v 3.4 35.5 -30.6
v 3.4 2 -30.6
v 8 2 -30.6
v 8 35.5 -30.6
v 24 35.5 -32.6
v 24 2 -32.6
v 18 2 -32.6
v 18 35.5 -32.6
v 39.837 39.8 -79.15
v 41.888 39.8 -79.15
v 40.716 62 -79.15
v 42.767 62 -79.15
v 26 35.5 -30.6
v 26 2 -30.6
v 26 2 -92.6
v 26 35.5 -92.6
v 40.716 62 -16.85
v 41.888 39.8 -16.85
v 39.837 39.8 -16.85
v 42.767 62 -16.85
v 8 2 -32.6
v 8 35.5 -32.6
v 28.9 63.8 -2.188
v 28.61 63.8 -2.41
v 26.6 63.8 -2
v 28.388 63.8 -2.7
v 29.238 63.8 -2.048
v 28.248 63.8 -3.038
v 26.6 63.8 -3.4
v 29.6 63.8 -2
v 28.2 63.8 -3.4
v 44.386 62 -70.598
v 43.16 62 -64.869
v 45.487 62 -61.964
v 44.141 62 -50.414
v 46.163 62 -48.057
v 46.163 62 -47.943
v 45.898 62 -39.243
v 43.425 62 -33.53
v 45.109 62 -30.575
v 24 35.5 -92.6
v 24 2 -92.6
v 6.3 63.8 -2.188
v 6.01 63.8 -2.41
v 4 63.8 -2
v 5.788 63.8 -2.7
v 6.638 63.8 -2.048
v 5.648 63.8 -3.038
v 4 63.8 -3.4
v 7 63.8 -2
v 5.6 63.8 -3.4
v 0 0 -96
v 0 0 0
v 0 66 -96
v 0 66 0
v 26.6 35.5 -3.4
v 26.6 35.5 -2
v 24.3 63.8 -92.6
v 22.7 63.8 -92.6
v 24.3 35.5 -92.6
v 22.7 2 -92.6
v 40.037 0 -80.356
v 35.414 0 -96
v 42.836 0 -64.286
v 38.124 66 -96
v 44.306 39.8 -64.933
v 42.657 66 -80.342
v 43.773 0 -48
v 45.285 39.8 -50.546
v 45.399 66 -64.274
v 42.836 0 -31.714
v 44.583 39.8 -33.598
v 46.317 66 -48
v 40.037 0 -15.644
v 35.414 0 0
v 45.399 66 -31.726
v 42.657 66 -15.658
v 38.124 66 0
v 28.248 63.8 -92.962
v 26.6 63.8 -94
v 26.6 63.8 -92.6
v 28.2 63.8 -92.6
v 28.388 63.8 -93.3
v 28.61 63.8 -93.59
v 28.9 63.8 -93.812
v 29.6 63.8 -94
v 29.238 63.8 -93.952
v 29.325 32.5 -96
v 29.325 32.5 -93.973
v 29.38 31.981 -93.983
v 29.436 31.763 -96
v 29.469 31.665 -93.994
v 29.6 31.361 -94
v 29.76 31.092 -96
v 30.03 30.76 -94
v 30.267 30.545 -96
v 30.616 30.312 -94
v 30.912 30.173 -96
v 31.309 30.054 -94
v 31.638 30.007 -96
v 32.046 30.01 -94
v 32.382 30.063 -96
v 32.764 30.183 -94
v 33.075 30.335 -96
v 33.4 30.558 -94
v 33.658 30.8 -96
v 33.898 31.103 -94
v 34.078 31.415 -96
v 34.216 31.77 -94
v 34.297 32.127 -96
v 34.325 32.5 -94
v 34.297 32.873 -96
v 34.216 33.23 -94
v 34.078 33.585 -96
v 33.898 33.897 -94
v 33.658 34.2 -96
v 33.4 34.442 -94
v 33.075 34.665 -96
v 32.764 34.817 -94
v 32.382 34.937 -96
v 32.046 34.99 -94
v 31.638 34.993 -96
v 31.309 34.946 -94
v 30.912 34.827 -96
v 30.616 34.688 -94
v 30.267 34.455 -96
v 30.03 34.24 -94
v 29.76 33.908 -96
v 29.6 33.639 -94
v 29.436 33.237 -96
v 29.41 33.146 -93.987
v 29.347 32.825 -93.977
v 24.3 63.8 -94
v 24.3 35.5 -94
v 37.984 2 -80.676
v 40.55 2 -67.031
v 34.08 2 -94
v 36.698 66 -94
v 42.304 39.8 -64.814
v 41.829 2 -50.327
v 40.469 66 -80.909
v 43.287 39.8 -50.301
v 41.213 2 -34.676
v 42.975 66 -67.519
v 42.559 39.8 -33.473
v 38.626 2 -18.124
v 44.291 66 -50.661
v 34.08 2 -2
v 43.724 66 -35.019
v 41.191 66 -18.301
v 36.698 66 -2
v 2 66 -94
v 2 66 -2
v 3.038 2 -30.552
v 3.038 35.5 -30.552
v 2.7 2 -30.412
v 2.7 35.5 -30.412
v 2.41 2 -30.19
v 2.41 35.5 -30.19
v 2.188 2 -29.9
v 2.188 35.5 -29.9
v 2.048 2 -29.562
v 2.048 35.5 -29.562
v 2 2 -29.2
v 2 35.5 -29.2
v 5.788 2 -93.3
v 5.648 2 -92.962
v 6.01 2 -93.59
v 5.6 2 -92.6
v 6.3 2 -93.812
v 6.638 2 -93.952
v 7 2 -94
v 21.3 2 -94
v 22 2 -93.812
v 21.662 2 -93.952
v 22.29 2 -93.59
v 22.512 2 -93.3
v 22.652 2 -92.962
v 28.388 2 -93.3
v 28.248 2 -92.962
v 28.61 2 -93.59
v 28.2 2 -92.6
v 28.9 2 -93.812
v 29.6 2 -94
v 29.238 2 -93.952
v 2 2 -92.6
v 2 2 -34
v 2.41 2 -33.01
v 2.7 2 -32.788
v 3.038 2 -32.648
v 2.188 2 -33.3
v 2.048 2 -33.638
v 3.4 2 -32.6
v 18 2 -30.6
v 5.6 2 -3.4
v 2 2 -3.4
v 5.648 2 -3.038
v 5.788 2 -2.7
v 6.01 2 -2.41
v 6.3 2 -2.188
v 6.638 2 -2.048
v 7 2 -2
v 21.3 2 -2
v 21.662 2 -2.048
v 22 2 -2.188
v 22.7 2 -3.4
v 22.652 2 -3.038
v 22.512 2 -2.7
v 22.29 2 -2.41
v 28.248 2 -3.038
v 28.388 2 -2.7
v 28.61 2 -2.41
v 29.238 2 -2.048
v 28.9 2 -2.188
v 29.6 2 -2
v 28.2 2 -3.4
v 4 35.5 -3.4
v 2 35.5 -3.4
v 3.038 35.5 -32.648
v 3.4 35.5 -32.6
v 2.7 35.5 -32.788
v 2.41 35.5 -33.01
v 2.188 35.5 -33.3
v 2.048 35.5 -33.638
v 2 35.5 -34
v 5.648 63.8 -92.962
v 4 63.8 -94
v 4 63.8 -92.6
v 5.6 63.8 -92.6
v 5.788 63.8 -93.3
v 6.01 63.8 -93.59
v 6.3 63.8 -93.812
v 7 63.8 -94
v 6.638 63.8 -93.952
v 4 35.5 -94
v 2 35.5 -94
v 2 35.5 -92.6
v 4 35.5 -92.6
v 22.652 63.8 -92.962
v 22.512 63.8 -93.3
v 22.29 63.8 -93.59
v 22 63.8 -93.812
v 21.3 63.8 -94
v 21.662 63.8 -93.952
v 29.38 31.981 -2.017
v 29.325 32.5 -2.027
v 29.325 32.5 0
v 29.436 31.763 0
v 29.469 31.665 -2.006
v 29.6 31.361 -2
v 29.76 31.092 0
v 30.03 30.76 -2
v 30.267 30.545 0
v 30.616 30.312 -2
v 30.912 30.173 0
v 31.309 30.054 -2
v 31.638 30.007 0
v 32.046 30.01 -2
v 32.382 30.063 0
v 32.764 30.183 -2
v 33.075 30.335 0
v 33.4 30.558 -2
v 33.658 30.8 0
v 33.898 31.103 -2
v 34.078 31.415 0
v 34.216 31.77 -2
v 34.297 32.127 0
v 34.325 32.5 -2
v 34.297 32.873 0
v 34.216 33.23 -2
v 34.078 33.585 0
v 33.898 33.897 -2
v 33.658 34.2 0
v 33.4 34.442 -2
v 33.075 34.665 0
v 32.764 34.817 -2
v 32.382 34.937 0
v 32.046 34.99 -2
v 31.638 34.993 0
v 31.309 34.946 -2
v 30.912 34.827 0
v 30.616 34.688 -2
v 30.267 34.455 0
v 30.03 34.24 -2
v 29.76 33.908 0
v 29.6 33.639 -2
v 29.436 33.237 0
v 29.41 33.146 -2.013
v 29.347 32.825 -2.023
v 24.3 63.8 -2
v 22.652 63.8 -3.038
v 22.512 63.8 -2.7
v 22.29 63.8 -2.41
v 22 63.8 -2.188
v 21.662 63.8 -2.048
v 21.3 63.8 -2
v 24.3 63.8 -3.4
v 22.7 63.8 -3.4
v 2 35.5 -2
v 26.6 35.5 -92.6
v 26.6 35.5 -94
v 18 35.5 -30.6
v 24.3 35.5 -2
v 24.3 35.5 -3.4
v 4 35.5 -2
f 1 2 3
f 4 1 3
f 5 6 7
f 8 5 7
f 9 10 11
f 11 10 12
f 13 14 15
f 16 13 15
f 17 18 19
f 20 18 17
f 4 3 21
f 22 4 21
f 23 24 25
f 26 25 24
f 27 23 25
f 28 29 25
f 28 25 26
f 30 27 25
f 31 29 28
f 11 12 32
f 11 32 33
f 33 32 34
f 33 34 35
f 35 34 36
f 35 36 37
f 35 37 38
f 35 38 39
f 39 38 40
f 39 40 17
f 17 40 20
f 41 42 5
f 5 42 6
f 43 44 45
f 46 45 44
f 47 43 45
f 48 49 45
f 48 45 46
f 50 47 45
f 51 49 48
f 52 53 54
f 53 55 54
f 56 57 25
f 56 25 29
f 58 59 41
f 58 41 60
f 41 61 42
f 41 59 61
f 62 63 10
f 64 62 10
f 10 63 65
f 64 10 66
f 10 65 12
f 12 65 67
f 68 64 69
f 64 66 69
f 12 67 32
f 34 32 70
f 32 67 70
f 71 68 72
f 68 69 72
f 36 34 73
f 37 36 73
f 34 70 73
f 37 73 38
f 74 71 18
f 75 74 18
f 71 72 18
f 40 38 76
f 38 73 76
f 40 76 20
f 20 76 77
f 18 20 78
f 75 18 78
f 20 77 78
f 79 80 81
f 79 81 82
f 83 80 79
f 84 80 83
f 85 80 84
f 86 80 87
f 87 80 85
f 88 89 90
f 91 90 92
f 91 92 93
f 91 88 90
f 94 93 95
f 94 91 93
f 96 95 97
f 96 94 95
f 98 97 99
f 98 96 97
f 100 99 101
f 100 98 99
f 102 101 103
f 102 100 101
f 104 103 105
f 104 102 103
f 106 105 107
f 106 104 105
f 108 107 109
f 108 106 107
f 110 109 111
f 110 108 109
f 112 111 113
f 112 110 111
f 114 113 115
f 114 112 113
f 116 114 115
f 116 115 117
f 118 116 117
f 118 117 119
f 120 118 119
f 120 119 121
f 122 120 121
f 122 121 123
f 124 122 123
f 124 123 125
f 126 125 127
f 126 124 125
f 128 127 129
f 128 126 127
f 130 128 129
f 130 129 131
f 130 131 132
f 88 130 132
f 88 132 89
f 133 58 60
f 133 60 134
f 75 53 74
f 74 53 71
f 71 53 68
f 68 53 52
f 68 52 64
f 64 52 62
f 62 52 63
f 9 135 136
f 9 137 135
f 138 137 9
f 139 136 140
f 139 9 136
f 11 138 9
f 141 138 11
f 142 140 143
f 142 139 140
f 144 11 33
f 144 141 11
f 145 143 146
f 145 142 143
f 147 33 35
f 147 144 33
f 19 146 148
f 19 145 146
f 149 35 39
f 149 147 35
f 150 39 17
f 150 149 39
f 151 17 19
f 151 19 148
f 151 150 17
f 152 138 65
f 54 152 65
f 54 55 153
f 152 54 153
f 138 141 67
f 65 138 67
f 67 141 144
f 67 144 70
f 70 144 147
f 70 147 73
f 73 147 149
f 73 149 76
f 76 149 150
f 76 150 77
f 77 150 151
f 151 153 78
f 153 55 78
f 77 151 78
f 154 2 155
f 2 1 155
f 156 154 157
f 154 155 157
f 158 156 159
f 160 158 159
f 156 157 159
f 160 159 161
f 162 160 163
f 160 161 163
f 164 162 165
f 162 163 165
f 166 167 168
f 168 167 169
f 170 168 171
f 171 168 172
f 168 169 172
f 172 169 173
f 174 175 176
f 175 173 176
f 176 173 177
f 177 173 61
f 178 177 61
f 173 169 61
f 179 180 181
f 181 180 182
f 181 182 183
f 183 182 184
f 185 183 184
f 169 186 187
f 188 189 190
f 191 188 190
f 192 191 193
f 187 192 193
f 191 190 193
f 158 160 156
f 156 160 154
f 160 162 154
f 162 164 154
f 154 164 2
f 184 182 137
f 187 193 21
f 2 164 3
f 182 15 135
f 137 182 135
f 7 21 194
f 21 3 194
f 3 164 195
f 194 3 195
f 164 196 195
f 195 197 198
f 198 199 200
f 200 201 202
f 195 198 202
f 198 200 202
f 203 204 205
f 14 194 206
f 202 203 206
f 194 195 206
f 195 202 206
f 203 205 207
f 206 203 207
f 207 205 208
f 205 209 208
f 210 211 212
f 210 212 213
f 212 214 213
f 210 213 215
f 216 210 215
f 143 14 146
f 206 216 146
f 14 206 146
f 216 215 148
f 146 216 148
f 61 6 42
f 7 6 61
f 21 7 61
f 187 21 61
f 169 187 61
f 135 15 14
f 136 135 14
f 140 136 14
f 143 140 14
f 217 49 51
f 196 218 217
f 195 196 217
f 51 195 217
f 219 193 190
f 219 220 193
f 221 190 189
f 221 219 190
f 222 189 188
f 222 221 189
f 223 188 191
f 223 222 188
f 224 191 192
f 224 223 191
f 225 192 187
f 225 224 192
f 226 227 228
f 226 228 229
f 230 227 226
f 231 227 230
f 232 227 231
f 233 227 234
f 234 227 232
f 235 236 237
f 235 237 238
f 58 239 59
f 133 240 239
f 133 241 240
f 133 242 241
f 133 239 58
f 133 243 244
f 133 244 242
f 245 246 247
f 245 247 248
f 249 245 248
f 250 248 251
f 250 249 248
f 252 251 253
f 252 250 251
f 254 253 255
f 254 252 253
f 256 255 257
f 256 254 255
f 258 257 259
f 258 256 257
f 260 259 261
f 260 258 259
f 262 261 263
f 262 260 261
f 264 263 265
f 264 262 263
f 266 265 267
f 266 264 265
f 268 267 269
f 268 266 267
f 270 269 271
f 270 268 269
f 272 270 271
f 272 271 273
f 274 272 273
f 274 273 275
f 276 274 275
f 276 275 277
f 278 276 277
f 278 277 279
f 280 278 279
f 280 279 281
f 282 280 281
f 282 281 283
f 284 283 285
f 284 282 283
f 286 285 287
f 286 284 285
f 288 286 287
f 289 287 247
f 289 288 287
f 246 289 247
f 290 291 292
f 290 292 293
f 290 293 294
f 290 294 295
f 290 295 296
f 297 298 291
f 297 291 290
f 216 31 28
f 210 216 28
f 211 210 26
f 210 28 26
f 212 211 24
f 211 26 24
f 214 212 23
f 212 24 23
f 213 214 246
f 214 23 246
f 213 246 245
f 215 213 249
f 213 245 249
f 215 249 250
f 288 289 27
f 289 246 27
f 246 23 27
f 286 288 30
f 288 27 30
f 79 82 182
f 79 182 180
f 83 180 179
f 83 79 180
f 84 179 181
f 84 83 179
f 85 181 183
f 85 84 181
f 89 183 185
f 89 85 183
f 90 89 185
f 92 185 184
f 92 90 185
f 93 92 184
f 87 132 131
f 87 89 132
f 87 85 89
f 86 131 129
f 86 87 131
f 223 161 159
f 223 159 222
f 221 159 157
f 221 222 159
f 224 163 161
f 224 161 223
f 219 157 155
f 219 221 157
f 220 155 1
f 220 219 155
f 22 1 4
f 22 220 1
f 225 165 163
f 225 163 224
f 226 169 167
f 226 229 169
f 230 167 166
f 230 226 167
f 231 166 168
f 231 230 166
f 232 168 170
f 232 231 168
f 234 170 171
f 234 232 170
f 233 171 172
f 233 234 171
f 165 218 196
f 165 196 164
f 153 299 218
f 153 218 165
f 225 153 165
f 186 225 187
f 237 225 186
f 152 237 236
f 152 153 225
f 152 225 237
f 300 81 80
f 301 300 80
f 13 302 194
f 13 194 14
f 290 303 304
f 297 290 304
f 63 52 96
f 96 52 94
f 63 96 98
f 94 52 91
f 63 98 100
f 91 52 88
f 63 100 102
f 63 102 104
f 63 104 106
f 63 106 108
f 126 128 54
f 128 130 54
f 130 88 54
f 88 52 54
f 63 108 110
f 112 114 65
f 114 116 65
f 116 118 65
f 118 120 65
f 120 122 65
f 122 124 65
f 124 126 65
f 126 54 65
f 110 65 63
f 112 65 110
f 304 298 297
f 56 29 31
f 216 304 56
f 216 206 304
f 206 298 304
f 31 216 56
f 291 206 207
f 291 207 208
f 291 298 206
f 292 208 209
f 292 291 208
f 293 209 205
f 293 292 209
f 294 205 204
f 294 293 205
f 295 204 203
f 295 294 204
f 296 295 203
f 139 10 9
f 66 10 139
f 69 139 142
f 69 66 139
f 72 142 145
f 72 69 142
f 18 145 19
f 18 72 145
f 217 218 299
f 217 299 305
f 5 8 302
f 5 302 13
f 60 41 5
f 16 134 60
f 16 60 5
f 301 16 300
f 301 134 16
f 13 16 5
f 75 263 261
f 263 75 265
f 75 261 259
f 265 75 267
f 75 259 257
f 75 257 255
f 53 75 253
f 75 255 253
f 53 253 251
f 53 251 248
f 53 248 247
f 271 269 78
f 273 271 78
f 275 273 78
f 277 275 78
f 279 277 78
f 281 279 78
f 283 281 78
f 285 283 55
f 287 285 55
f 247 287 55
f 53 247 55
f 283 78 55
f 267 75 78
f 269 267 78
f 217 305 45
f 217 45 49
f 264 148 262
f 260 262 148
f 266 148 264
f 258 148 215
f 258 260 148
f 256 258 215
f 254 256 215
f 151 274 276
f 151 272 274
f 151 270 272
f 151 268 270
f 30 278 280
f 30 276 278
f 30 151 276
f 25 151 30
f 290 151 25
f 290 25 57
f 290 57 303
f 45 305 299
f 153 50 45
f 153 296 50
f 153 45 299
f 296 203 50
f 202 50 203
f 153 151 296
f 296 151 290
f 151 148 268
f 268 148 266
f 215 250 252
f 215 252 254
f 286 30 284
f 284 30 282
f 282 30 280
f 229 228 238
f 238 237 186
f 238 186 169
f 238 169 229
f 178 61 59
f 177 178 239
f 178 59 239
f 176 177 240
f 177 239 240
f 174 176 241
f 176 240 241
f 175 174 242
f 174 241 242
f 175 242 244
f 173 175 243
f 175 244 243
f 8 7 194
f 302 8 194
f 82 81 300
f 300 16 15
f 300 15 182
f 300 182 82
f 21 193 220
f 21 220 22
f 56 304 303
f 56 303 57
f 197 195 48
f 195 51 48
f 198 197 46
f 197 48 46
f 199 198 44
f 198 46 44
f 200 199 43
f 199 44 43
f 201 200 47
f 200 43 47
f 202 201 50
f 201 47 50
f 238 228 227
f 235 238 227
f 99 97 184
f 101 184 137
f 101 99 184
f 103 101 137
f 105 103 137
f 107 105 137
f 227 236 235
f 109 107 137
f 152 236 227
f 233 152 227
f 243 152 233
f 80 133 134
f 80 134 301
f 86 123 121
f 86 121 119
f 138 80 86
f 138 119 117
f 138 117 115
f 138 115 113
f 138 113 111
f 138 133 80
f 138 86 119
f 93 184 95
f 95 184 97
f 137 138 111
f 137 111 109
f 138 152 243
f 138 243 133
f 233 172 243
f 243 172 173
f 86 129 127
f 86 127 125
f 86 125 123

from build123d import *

# Parameters (mm, degrees)
SHELL1_T               = -2
BOSS_EXTRUDE1_START    = 2
SKETCH7_6_W            = 6
SKETCH7_6_H            = 2
BOSS_EXTRUDE1_DEPTH    = 33.5
SKETCH7_9_W            = 2
SKETCH7_9_H            = 1.4
SKETCH7_9_W_2          = 2.3
SKETCH7_9_W_3          = 0.6
BOSS_EXTRUDE3_DEPTH    = 35.5
SKETCH7_8_W            = 1.6
SKETCH7_8_H            = 1.4
SKETCH7_8_W_2          = 1.3
SKETCH7_8_W_3          = 0.3
BOSS_EXTRUDE2_DEPTH    = 63.8
FILLET1_R              = 1.4
CUT_EXTRUDE1_START     = -46.163243618
CUT_EXTRUDE1_OUTLINE_W = 62.3
CUT_EXTRUDE1_OUTLINE_H = 22.2
CUT_EXTRUDE1_DEPTH     = 6.326424063
CUT_EXTRUDE2_START     = -2
SKETCH11_R             = 2.5
CUT_EXTRUDE2_DEPTH     = 96


# Read off the part's stored shape, not the designer's step: Cut-Extrude1
with BuildPart() as part:
    # Sketch7 → Loft1 section 0
    with BuildSketch(Plane(origin=(0, 0, 0), x_dir=(1, 0, 0), z_dir=(0, 1, 0))):
        with BuildLine():
            Line((0, 96), (35.41423357, 96))
            ThreePointArc((35.41423357, 96), (43.772922591, 48), (35.41423357, 0))
            Line((35.41423357, 0), (0, 0))
            Line((0, 0), (0, 96))
        make_face()
    # Sketch9 → Loft1 section 1
    with BuildSketch(Plane(origin=(0, 66, 0), x_dir=(1, 0, 0), z_dir=(0, 1, 0))):
        with BuildLine():
            Line((0, 96), (38.124209432, 96))
            ThreePointArc((38.124209432, 96), (46.317469671, 48), (38.124209432, 0))
            Line((38.124209432, 0), (0, 0))
            Line((0, 0), (0, 96))
        make_face()
    loft()

    # Shell1
    shell1_openings = [part.faces().sort_by_distance(p)[0] for p in [
        (21.876860879, 66, -48),
    ]]
    offset(amount=SHELL1_T, openings=shell1_openings, kind=Kind.INTERSECTION)

    # Sketch7<6> → Boss-Extrude1 (add)
    with BuildSketch(Plane(origin=(0, 0, 0), x_dir=(1, 0, 0), z_dir=(0, 1, 0)).offset(BOSS_EXTRUDE1_START)):
        with Locations((5, 31.6)):
            Rectangle(SKETCH7_6_W, SKETCH7_6_H)
        Polygon((18, 32.6), (18, 30.6), (26, 30.6), (26, 94), (24, 94), (24, 32.6), align=None)
    extrude(amount=BOSS_EXTRUDE1_DEPTH)

    # Sketch7<9> → Boss-Extrude3 (add)
    with BuildSketch(Plane(origin=(0, 0, 0), x_dir=(1, 0, 0), z_dir=(0, 1, 0))):
        with Locations((3, 2.7)):
            Rectangle(SKETCH7_9_W, SKETCH7_9_H)
        with Locations((25.45, 2.7)):
            Rectangle(SKETCH7_9_W_2, SKETCH7_9_H)
        with Locations((3, 93.3)):
            Rectangle(SKETCH7_9_W, SKETCH7_9_H)
        with Locations((26.3, 93.3)):
            Rectangle(SKETCH7_9_W_3, SKETCH7_9_H)
    extrude(amount=BOSS_EXTRUDE3_DEPTH)

    # Sketch7<8> → Boss-Extrude2 (add)
    with BuildSketch(Plane(origin=(0, 0, 0), x_dir=(1, 0, 0), z_dir=(0, 1, 0))):
        with Locations((4.8, 2.7)):
            Rectangle(SKETCH7_8_W, SKETCH7_8_H)
        with Locations((27.4, 2.7)):
            Rectangle(SKETCH7_8_W, SKETCH7_8_H)
        with Locations((23.5, 2.7)):
            Rectangle(SKETCH7_8_W, SKETCH7_8_H)
        with Locations((4.8, 93.3)):
            Rectangle(SKETCH7_8_W, SKETCH7_8_H)
        with Locations((27.4, 93.3)):
            Rectangle(SKETCH7_8_W, SKETCH7_8_H)
        with Locations((23.35, 93.3)):
            Rectangle(SKETCH7_8_W_2, SKETCH7_8_H)
        with Locations((24.15, 93.3)):
            Rectangle(SKETCH7_8_W_3, SKETCH7_8_H)
    extrude(amount=BOSS_EXTRUDE2_DEPTH)

    # Fillet1
    fillet1_edges = [part.edges().sort_by_distance(p)[0] for p in [
        (22.7, 32.9, -94),
        (28.2, 32.9, -94),
        (5.6, 32.9, -94),
        (2, 18.75, -32.6),
        (2, 18.75, -30.6),
        (5.6, 32.9, -2),
        (22.7, 32.9, -2),
        (28.2, 32.9, -2),
    ]]
    fillet(fillet1_edges, radius=FILLET1_R - 0.0001)  # a hair under: the kernel refuses the full size

    # Cut-Extrude1 outline → Cut-Extrude1 (cut)
    with BuildSketch(Plane.ZY.offset(CUT_EXTRUDE1_START)):
        with Locations((-48, 50.9)):
            Rectangle(CUT_EXTRUDE1_OUTLINE_W, CUT_EXTRUDE1_OUTLINE_H)
    extrude(amount=CUT_EXTRUDE1_DEPTH, mode=Mode.SUBTRACT)

    # Sketch11 → Cut-Extrude2 (cut)
    with BuildSketch(Plane.XY.offset(-94).offset(CUT_EXTRUDE2_START)):
        with Locations(Location((31.825322124, 32.5, 0), (0, 0, 180))):
            Circle(SKETCH11_R)
    extrude(amount=CUT_EXTRUDE2_DEPTH, mode=Mode.SUBTRACT)


solid = part.part
